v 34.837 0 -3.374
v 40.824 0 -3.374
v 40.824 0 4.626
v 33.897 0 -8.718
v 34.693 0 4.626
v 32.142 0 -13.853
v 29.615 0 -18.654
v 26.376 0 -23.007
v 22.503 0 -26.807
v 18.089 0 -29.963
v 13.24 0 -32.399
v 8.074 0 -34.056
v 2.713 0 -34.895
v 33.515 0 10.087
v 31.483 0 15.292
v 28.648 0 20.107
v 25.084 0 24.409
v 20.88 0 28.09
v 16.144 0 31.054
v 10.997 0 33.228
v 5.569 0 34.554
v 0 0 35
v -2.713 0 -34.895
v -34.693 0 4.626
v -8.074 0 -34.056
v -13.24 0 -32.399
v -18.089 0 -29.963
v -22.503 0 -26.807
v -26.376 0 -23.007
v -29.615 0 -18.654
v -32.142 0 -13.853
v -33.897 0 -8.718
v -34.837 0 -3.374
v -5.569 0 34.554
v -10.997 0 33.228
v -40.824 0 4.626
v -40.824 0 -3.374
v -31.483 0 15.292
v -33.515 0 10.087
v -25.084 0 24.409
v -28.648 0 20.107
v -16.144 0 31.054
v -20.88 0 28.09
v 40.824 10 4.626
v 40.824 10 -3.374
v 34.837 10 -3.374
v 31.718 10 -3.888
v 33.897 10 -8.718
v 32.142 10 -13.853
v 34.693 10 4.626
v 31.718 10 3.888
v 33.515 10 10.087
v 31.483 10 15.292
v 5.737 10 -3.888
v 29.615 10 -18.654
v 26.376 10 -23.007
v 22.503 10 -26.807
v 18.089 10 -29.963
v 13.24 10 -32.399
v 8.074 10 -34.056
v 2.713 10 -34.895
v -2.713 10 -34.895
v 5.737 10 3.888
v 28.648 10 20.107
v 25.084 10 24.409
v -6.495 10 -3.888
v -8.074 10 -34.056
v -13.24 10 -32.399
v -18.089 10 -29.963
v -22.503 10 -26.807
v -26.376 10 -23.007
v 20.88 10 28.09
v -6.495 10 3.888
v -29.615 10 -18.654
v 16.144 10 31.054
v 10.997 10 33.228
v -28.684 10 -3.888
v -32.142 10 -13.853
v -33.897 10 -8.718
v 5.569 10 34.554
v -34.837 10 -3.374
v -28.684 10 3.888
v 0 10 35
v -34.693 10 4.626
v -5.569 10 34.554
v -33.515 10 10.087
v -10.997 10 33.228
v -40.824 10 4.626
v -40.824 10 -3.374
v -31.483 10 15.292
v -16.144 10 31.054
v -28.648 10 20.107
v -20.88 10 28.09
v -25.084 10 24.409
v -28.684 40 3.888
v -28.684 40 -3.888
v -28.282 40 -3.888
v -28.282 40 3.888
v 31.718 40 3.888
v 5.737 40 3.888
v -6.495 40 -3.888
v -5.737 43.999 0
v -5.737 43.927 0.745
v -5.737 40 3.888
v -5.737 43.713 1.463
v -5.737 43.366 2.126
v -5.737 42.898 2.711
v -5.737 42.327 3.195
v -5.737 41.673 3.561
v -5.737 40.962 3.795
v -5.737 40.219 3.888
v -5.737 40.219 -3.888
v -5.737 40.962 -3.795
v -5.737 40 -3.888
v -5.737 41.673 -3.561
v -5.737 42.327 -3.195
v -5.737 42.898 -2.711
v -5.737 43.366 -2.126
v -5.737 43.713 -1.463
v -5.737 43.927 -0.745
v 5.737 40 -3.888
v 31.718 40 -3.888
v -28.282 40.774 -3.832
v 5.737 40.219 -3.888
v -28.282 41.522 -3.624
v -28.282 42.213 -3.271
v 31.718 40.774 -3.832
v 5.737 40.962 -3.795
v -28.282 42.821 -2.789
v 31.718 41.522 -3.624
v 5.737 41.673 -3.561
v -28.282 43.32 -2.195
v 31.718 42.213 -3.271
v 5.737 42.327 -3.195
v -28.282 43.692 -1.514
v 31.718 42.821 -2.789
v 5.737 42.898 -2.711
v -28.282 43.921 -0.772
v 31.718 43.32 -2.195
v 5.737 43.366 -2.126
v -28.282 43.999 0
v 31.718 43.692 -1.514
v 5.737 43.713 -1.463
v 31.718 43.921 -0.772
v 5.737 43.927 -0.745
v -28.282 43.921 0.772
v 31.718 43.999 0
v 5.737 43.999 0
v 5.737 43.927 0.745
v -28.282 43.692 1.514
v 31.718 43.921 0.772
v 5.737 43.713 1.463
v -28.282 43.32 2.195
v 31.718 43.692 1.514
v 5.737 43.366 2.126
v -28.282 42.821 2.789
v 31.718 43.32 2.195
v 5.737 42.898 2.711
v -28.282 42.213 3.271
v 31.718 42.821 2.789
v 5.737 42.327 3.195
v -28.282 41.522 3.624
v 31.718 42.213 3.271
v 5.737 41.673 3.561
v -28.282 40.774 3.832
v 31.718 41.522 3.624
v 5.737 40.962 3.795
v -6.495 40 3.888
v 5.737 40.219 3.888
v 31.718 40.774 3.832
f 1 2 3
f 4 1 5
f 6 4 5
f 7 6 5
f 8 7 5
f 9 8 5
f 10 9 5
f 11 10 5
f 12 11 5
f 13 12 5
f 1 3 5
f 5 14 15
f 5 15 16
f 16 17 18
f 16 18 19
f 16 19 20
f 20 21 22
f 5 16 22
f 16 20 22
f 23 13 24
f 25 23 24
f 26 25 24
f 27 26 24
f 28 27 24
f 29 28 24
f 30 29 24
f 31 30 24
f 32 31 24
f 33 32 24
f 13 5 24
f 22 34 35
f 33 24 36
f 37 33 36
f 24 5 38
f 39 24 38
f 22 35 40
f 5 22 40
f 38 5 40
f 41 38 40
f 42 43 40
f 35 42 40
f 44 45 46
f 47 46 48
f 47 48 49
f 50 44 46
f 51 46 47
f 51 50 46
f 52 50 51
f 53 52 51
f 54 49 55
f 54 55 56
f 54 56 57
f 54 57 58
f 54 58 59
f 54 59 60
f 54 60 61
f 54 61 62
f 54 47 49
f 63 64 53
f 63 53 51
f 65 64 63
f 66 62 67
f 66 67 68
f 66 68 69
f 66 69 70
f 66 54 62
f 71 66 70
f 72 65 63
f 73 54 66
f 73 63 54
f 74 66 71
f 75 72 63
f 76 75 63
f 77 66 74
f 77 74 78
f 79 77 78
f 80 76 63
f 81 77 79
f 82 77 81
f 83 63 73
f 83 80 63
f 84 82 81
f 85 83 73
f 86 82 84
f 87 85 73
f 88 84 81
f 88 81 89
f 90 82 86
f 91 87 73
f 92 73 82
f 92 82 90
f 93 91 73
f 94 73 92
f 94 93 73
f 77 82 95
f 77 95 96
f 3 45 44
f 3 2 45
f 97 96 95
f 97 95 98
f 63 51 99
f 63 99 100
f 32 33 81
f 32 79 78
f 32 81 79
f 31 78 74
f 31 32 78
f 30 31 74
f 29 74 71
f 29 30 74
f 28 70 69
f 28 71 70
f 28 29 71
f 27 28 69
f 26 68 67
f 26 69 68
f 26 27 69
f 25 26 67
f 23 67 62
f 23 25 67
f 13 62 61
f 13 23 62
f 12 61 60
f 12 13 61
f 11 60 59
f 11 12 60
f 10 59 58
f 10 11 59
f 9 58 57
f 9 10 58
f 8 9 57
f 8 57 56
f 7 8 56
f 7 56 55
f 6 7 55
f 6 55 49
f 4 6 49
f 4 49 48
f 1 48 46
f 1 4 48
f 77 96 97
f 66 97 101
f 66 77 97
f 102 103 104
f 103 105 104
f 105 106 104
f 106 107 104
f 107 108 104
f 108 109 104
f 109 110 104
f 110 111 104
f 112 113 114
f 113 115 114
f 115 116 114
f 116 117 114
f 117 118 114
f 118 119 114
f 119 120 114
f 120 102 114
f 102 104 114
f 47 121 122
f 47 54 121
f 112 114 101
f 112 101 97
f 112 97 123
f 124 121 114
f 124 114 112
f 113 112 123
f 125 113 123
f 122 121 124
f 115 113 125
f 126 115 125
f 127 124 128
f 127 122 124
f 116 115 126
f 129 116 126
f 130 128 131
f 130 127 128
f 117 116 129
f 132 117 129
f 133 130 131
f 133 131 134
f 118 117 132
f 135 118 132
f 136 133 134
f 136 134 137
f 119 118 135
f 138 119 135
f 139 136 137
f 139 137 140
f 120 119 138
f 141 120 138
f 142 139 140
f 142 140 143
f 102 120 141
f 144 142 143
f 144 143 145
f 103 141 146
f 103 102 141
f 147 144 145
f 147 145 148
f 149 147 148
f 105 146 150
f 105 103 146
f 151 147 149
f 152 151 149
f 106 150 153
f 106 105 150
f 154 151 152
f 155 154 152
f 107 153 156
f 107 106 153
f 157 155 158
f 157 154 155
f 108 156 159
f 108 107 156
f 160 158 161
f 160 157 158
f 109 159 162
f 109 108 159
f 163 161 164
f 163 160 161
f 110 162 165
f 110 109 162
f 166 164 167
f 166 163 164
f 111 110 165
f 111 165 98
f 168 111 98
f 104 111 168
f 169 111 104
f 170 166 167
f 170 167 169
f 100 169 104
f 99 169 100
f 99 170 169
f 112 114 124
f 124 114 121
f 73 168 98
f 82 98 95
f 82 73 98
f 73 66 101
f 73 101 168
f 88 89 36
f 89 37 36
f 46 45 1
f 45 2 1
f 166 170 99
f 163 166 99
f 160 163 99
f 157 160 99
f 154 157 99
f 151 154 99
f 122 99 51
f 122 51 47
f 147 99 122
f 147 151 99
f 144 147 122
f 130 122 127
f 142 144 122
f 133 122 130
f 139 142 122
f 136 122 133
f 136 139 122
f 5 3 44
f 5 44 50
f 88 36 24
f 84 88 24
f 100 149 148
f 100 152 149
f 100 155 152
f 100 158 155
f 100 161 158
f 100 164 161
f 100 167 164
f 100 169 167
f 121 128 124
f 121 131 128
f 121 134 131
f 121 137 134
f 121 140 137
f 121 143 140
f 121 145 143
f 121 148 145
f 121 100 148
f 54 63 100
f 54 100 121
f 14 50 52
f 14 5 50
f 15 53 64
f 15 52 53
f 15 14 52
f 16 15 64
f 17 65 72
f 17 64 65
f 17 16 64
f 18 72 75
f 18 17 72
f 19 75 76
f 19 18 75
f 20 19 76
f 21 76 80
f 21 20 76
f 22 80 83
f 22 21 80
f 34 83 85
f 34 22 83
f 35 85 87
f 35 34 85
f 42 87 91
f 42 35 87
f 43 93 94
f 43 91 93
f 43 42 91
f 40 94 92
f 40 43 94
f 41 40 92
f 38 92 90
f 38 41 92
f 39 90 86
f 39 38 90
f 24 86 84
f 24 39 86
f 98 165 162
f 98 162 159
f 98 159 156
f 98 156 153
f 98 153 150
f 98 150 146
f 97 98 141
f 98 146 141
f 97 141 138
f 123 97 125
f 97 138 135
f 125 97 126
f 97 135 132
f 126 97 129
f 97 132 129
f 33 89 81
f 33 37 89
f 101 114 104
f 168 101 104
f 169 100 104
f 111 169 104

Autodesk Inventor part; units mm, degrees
ref_plane "YZ Plane" through (0, 0, 0) normal (1, 0, 0) x (0, 1, 0)
ref_plane "XZ Plane" through (0, 0, 0) normal (0, 1, 0) x (-1, 0, 0)
ref_plane "XY Plane" through (0, 0, 0) normal (0, 0, 1) x (1, 0, 0)
sketch "Sketch1" plane through (0, 0, 0) normal (0, 1, 0) x (-1, 0, 0)
  line L0 (-34.8245, 0.6257) -> (-40.8245, 0.6257)
  line L1 (-40.8245, 0.6257) -> (-40.8245, 4.6257)
  line L2 (-40.8245, 4.6257) -> (-34.693, 4.6257)
  line L3 (-40.8245, 0.6257) -> (-40.8245, -3.3743)
  line L4 (-40.8245, -3.3743) -> (-34.837, -3.3743)
  line L5 (0, 23.9304) -> (0, -22.2454)
  line L6 (34.8245, 0.6257) -> (40.8245, 0.6257)
  line L7 (40.8245, 0.6257) -> (40.8245, 4.6257)
  line L8 (40.8245, 4.6257) -> (34.693, 4.6257)
  line L9 (40.8245, 0.6257) -> (40.8245, -3.3743)
  line L10 (40.8245, -3.3743) -> (34.837, -3.3743)
  arc A0 (34.693, 4.6257) -> (-34.693, 4.6257) centre (0, 0) ccw
  arc A1 (-34.837, -3.3743) -> (34.837, -3.3743) centre (0, 0) ccw
  point P0 (-34.693, -3.3743)
  point P1 (34.693, -3.3743)
  dimension "d1" = 4
  dimension "d2" = 6
  dimension "d5" = 35
  dimension "d6" = 35
extrude "Extrusion1" add sketch "Sketch1" along normal blind 10
sketch "Sketch2" plane through (0, 10, 0) normal (0, 1, 0) x (1, 0, 0)
  point P0 (0, 0)
sketch "Sketch3" plane through (0, 10, 0) normal (0, 1, 0) x (1, 0, 0)
  point P0 (0, 0)
sketch "Sketch4" plane through (0, 10, 0) normal (0, 1, 0) x (1, 0, 0)
  line L0 (-28.6835, 3.8877) -> (-6.4953, 3.8877)
  line L1 (-6.4953, 3.8877) -> (-6.4953, -3.8877)
  line L2 (-6.4953, -3.8877) -> (-28.6835, -3.8877)
  line L3 (-28.6835, -3.8877) -> (-28.6835, 3.8877)
  line L4 (-28.6835, 3.8877) -> (-6.4953, -3.8877) construction
  line L5 (-6.4953, 3.8877) -> (-28.6835, -3.8877) construction
  line L6 (5.7367, 3.8877) -> (31.7178, 3.8877)
  line L7 (31.7178, 3.8877) -> (31.7178, -3.8877)
  line L8 (31.7178, -3.8877) -> (5.7367, -3.8877)
  line L9 (5.7367, -3.8877) -> (5.7367, 3.8877)
  line L10 (5.7367, 3.8877) -> (31.7178, -3.8877) construction
  line L11 (31.7178, 3.8877) -> (5.7367, -3.8877) construction
  point P0 (0, 0)
  point P1 (-17.5894, 0)
  point P2 (18.7272, 0)
extrude "Extrusion2" add sketch "Sketch4" along normal blind 30
sketch "Sketch5" plane through (31.7178, 10, 3.8877) normal (1, 0, 0) x (0, 0, -1)
  line L0 (7.7754, 30) -> (0, 30) projected
  arc A0 (7.7754, 30) -> (0, 30) centre (3.8877, 30.1095) ccw
  point P0 (3.8877, -10)
extrude "Extrusion3" add sketch "Sketch5" against normal blind 60
sketch "Sketch6" plane through (0, 10, 0) normal (0, 1, 0) x (1, 0, 0)
  line L0 (5.7367, -3.8877) -> (5.7367, 3.8877) projected
  line L1 (-5.7367, 3.8877) -> (5.7367, 3.8877)
  line L2 (5.7367, 3.8877) -> (5.7367, -3.8877)
  line L3 (5.7367, -3.8877) -> (-5.7367, -3.8877)
  line L4 (-5.7367, -3.8877) -> (-5.7367, 3.8877)
  line L5 (-5.7367, 3.8877) -> (5.7367, -3.8877) construction
  line L6 (5.7367, 3.8877) -> (-5.7367, -3.8877) construction
  point P0 (0, 0)
extrude "Extrusion4" cut sketch "Sketch6" along normal blind 60
properties part number "joy part 2"
